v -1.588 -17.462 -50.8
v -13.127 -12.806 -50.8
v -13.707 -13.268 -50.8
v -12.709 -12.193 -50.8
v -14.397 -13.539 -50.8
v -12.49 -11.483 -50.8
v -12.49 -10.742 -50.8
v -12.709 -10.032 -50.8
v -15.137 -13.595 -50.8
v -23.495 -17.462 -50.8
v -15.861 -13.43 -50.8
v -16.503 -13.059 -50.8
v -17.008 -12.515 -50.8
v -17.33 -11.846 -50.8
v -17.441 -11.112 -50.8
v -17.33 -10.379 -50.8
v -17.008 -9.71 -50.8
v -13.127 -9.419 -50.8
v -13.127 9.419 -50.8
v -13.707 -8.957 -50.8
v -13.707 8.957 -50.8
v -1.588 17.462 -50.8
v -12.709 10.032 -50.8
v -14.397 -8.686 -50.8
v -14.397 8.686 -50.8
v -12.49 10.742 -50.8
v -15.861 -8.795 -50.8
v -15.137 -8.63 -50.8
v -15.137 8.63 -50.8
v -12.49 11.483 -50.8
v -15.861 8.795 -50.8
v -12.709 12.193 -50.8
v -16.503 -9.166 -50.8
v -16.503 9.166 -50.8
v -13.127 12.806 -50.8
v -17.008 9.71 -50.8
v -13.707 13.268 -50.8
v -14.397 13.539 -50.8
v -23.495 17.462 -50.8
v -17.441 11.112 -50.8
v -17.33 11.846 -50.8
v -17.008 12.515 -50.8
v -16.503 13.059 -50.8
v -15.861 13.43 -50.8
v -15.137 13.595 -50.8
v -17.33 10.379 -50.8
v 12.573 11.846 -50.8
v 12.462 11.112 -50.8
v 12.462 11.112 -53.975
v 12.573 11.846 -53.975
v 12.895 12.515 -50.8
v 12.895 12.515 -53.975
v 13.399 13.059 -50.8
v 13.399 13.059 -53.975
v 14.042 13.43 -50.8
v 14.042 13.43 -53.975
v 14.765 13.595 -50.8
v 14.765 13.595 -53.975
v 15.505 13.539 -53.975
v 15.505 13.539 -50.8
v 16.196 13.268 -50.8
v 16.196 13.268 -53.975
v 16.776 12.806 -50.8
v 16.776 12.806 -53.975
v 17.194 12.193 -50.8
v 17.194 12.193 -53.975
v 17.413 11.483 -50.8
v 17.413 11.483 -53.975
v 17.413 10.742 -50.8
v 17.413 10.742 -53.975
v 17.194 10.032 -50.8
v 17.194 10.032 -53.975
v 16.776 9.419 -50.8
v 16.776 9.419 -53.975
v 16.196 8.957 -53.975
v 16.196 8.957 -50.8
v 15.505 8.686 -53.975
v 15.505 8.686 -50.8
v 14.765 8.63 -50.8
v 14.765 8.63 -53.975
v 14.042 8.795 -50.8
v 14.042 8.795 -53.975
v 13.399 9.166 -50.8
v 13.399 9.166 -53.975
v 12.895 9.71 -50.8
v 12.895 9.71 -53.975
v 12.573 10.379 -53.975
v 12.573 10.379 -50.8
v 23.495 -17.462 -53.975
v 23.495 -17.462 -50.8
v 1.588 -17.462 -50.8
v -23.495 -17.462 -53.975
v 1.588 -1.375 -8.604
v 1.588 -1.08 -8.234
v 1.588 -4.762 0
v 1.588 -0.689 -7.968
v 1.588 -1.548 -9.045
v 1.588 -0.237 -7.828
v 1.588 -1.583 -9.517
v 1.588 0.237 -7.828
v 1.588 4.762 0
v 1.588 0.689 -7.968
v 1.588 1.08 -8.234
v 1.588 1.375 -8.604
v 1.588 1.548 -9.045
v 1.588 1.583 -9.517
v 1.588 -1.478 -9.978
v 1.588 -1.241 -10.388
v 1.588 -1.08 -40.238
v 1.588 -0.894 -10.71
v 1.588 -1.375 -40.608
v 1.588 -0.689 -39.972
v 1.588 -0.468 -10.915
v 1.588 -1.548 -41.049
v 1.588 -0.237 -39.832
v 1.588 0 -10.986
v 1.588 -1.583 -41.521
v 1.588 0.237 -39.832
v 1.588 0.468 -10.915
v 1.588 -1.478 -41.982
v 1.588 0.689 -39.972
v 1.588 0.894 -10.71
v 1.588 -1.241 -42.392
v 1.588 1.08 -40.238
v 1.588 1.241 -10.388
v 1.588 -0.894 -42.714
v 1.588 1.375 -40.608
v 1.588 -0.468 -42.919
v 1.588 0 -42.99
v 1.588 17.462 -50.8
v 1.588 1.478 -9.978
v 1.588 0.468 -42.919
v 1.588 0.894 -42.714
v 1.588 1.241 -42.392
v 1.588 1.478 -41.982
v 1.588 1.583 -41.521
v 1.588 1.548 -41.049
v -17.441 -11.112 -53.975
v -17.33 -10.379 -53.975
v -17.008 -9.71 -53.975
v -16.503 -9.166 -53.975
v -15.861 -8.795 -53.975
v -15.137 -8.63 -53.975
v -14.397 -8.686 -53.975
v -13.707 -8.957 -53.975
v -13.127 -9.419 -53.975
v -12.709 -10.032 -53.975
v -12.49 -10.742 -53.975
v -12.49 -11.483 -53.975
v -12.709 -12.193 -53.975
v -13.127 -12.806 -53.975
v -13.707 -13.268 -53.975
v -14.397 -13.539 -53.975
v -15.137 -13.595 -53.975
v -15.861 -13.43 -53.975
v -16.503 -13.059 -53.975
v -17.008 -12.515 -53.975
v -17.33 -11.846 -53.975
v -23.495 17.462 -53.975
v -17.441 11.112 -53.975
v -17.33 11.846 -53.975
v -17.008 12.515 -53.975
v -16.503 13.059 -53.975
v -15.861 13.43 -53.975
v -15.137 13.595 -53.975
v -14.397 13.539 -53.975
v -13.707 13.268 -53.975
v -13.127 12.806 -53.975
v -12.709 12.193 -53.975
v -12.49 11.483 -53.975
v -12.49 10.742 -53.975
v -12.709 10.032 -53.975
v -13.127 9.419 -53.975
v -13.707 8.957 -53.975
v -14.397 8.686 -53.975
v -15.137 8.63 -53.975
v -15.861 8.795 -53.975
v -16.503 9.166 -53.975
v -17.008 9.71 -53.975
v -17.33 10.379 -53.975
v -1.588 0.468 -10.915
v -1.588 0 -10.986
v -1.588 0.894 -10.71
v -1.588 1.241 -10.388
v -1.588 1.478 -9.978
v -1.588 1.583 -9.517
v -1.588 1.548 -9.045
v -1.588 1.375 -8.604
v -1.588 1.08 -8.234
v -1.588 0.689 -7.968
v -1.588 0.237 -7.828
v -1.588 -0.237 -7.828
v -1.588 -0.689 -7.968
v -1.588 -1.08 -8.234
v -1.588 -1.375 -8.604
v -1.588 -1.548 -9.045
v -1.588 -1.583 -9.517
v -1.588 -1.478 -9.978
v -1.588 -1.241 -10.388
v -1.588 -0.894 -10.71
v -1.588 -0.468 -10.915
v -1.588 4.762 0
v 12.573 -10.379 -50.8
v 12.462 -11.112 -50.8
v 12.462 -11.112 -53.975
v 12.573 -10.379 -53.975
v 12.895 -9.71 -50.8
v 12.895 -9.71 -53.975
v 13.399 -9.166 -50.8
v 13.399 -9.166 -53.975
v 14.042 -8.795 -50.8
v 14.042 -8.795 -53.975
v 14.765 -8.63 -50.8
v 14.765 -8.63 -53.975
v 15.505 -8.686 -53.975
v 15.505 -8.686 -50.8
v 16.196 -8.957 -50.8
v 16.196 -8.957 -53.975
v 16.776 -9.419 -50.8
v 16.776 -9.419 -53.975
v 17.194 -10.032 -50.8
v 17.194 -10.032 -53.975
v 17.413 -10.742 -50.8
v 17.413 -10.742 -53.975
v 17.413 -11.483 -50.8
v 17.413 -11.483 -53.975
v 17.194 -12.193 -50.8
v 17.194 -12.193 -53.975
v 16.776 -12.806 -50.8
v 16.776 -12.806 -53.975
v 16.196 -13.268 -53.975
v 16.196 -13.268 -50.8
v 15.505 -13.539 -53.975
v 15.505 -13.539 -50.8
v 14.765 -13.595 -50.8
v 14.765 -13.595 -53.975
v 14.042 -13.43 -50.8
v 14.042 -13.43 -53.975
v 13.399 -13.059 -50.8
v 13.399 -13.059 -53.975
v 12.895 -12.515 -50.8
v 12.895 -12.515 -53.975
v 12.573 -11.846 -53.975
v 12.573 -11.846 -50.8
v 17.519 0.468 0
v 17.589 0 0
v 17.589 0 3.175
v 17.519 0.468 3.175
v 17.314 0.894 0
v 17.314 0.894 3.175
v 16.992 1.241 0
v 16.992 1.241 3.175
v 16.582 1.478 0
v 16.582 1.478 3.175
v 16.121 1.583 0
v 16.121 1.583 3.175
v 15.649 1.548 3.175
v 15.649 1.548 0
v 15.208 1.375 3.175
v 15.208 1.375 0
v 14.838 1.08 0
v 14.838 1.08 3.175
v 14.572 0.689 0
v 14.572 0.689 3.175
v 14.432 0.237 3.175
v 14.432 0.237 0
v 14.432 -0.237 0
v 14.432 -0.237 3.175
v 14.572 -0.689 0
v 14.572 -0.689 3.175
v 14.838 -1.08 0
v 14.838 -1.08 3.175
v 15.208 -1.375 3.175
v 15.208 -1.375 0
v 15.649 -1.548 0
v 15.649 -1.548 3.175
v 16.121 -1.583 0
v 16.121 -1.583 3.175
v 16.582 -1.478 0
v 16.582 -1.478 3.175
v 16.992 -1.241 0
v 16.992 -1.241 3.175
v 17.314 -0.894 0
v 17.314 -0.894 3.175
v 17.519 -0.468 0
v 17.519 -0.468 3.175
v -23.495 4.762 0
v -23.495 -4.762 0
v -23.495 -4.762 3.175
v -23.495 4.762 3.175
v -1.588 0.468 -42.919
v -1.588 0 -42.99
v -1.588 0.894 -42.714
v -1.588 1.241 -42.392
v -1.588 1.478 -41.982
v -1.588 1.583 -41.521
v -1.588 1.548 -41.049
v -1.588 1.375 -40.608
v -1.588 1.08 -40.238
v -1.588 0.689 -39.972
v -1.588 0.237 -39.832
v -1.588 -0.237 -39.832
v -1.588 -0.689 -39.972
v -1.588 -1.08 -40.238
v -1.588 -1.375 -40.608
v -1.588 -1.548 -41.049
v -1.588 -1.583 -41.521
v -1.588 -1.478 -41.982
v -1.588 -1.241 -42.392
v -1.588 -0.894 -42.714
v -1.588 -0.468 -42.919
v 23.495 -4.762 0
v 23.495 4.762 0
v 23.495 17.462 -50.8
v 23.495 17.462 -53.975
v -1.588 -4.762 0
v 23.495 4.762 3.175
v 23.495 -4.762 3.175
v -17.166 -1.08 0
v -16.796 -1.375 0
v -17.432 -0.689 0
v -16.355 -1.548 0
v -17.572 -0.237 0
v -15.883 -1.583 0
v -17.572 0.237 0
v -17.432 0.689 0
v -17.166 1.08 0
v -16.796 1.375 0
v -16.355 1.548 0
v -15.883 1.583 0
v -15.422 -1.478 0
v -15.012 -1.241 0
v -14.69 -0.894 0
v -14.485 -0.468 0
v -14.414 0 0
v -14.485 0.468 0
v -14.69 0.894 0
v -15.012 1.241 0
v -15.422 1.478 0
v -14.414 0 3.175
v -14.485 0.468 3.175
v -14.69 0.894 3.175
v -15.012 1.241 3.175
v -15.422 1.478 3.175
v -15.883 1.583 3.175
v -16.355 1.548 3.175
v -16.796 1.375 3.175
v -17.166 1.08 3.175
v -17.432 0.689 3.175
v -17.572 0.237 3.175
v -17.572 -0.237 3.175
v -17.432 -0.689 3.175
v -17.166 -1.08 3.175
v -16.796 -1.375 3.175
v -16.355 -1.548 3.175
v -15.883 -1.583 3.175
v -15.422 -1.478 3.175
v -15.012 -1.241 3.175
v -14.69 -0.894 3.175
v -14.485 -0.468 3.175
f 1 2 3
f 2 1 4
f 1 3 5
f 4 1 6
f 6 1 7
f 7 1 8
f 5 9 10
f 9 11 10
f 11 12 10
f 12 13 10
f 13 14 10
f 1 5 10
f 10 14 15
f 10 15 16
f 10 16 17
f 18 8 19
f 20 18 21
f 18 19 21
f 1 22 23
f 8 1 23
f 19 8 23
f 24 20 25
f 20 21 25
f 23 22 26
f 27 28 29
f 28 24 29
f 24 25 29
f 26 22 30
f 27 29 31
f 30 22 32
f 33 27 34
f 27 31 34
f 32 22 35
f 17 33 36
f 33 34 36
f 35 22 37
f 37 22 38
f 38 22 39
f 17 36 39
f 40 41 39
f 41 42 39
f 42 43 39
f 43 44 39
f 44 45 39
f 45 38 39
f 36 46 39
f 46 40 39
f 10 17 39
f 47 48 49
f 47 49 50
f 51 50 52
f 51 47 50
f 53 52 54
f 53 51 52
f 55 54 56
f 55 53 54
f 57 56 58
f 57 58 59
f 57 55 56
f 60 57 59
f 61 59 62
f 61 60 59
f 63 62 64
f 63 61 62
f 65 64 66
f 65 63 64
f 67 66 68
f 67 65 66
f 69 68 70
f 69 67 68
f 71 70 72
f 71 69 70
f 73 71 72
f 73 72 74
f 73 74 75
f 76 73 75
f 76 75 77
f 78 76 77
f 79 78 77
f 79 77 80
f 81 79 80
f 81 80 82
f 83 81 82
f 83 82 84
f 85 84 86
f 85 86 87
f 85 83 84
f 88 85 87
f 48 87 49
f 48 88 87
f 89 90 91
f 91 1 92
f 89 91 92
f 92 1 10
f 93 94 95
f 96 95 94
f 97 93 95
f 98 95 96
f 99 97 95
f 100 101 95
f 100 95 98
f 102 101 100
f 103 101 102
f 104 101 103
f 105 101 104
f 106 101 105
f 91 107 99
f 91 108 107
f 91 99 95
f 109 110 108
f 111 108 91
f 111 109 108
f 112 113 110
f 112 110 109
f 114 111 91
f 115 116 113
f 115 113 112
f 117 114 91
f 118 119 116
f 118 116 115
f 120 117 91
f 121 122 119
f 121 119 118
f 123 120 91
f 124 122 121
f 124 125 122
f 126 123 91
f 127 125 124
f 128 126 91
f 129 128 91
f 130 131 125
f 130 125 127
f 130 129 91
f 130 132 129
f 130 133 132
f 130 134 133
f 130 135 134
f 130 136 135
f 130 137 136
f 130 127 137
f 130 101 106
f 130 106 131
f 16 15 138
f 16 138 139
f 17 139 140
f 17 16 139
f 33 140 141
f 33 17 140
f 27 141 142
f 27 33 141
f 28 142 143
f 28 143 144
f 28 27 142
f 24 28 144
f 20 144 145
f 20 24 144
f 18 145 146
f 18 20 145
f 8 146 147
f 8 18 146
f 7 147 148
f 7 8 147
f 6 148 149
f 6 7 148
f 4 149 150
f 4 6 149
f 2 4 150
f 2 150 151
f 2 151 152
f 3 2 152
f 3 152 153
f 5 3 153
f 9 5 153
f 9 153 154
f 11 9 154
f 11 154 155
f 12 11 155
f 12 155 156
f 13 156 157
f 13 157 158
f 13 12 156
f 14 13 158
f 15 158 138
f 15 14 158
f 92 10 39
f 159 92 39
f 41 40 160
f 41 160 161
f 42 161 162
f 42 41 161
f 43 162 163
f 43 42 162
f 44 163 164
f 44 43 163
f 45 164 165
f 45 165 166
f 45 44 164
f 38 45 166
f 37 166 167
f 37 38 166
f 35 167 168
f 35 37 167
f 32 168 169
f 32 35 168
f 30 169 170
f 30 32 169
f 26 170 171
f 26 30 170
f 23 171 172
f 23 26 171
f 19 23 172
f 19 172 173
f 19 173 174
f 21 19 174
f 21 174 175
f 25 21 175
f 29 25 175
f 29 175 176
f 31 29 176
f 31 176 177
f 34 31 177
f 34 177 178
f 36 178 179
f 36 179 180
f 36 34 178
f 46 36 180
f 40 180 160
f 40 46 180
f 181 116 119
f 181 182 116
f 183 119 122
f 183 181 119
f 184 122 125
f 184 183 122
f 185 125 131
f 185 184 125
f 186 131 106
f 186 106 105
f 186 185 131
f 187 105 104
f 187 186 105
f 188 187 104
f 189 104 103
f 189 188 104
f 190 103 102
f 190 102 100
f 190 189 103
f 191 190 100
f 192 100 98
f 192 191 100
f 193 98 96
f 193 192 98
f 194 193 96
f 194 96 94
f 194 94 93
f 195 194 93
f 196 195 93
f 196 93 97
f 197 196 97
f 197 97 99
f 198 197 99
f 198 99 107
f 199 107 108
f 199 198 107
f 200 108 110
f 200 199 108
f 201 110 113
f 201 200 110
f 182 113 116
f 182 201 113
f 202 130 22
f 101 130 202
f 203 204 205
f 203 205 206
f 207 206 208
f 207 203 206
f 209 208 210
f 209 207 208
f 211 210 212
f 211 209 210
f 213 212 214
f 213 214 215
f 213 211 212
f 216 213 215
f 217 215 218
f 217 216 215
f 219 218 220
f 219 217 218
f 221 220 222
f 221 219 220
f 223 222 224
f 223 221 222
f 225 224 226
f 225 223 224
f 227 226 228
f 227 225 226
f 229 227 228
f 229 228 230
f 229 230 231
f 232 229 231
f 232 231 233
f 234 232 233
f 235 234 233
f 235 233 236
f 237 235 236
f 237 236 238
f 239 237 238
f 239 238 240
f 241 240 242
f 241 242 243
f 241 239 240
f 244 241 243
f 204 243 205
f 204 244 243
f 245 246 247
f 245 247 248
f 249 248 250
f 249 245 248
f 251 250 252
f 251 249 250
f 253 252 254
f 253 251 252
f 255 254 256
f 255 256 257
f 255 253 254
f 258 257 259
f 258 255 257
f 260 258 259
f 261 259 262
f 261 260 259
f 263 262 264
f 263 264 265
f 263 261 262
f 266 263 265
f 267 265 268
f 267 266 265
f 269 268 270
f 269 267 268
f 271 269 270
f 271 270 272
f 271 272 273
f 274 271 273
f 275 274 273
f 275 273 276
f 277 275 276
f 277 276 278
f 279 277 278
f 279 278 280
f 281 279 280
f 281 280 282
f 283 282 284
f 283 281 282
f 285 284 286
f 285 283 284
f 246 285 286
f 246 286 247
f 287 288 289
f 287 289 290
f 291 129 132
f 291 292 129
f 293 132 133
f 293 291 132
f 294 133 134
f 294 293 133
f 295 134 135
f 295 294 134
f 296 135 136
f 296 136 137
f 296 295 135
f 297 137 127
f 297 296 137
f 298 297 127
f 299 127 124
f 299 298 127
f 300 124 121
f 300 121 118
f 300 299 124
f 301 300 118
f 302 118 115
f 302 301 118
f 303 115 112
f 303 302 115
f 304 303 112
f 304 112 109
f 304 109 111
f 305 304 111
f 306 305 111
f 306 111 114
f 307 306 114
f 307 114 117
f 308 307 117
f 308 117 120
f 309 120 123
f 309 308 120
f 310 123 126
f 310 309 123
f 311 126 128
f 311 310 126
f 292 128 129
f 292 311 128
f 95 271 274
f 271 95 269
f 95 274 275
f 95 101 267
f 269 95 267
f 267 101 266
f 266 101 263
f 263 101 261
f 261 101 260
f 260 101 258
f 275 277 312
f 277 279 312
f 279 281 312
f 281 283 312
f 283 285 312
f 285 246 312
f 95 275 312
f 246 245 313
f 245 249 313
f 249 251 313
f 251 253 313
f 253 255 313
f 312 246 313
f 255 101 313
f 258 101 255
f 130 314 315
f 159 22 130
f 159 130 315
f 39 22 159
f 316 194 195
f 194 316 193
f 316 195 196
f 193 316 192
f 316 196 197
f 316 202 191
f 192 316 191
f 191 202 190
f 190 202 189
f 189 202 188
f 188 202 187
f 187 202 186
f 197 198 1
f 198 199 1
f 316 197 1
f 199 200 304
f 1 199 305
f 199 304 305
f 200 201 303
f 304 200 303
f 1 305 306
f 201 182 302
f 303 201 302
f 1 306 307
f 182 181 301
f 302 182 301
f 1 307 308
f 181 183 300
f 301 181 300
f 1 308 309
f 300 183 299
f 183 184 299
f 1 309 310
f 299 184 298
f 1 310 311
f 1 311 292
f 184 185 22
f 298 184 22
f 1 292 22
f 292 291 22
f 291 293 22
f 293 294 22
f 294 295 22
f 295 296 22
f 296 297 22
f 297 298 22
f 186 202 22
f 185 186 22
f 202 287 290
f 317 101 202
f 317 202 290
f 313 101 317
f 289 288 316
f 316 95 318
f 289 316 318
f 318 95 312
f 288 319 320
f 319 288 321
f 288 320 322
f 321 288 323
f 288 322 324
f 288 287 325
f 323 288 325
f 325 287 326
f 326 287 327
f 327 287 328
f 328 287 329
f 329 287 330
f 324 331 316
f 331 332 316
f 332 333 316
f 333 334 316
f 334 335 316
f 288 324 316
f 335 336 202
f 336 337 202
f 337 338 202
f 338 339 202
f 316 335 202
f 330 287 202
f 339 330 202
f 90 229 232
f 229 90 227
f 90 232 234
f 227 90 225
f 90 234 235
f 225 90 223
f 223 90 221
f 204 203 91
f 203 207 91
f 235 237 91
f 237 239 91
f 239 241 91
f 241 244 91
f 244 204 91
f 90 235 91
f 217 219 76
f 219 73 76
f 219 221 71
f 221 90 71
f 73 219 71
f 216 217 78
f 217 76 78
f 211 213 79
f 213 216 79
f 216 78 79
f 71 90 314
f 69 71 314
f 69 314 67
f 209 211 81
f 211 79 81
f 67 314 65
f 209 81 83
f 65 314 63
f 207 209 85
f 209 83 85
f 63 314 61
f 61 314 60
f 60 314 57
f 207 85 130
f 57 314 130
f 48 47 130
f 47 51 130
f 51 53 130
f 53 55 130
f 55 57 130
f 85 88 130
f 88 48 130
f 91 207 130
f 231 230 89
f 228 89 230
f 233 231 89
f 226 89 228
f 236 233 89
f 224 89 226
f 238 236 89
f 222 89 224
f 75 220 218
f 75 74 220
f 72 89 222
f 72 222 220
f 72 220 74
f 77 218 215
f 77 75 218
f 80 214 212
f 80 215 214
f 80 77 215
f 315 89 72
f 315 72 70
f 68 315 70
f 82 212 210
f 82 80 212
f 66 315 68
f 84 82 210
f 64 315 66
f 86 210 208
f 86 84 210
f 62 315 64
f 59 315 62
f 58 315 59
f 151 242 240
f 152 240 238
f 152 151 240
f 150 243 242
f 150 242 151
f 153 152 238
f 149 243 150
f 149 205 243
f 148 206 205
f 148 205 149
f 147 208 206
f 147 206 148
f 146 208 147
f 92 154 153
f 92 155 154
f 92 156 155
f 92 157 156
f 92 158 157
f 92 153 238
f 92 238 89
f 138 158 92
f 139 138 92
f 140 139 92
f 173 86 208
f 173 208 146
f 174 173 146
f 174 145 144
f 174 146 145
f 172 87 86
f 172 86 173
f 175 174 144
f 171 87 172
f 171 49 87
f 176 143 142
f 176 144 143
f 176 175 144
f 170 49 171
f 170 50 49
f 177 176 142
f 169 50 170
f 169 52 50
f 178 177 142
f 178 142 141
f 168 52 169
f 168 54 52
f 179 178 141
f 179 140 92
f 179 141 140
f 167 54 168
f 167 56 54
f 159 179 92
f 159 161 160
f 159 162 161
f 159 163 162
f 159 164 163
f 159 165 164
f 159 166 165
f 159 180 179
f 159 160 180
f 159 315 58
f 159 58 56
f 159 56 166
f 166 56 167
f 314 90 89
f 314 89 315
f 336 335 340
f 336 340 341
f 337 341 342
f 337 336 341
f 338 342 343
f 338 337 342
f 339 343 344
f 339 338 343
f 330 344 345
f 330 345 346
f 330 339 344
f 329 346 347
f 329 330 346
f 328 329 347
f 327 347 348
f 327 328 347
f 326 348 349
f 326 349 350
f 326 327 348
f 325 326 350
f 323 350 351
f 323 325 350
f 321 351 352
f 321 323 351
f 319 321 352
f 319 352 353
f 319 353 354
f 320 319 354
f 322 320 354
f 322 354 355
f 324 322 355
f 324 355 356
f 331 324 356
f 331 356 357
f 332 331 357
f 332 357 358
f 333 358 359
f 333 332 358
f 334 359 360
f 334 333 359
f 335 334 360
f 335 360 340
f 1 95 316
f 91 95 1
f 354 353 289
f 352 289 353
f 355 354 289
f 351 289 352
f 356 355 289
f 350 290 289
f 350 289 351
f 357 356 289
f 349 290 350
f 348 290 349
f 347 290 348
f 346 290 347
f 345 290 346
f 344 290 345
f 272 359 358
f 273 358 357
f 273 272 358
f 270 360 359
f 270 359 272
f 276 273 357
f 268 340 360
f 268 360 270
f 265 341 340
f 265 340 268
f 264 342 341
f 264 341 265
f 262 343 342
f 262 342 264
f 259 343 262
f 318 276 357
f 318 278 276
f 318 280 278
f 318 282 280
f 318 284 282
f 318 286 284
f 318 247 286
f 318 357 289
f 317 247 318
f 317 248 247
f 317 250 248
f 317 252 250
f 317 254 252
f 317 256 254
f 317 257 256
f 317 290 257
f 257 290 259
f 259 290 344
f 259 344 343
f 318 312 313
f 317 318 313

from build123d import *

# Parameters (mm, degrees)
SKETCH1_W           = 46.99
SKETCH1_H           = 9.525
SKETCH1_R           = 1.5875
BOSS_EXTRUDE1_DEPTH = 3.175
SKETCH2_R           = 1.5875
BOSS_EXTRUDE2_DEPTH = 1.5875
SKETCH4_W           = 46.99
SKETCH4_H           = 34.925
SKETCH4_R           = 2.4892
BOSS_EXTRUDE3_DEPTH = 3.175


with BuildPart() as part:
    # Sketch1 → Boss-Extrude1 (new body)
    with BuildSketch(Plane.XY):
        Rectangle(SKETCH1_W, SKETCH1_H)
        with Locations((-16.002, 0)):
            Circle(SKETCH1_R, mode=Mode.SUBTRACT)
        with Locations((16.002, 0)):
            Circle(SKETCH1_R, mode=Mode.SUBTRACT)
    extrude(amount=BOSS_EXTRUDE1_DEPTH)

    # Sketch2 → Boss-Extrude2 (add, symmetric)
    with BuildSketch(Plane(origin=(0, 0, 0), x_dir=(0, 0, -1), z_dir=(1, 0, 0))):
        Polygon((50.8, 17.4625), (0, 4.7625), (0, -4.7625), (50.8, -17.4625), align=None)
        with Locations((9.398, 0)):
            Circle(SKETCH2_R, mode=Mode.SUBTRACT)
        with Locations((41.402, 0)):
            Circle(SKETCH2_R, mode=Mode.SUBTRACT)
    extrude(amount=BOSS_EXTRUDE2_DEPTH, both=True)

    # Sketch4 → Boss-Extrude3 (add)
    with BuildSketch(Plane(origin=(0, 0, -50.8), x_dir=(-1, 0, 0), z_dir=(0, 0, -1))):
        Rectangle(SKETCH4_W, SKETCH4_H)
        with Locations((-14.951363636, 11.1125)):
            Circle(SKETCH4_R, mode=Mode.SUBTRACT)
        with Locations((14.951363636, 11.1125)):
            Circle(SKETCH4_R, mode=Mode.SUBTRACT)
        with Locations((14.951363636, -11.1125)):
            Circle(SKETCH4_R, mode=Mode.SUBTRACT)
        with Locations((-14.951363636, -11.1125)):
            Circle(SKETCH4_R, mode=Mode.SUBTRACT)
    extrude(amount=BOSS_EXTRUDE3_DEPTH)


solid = part.part
